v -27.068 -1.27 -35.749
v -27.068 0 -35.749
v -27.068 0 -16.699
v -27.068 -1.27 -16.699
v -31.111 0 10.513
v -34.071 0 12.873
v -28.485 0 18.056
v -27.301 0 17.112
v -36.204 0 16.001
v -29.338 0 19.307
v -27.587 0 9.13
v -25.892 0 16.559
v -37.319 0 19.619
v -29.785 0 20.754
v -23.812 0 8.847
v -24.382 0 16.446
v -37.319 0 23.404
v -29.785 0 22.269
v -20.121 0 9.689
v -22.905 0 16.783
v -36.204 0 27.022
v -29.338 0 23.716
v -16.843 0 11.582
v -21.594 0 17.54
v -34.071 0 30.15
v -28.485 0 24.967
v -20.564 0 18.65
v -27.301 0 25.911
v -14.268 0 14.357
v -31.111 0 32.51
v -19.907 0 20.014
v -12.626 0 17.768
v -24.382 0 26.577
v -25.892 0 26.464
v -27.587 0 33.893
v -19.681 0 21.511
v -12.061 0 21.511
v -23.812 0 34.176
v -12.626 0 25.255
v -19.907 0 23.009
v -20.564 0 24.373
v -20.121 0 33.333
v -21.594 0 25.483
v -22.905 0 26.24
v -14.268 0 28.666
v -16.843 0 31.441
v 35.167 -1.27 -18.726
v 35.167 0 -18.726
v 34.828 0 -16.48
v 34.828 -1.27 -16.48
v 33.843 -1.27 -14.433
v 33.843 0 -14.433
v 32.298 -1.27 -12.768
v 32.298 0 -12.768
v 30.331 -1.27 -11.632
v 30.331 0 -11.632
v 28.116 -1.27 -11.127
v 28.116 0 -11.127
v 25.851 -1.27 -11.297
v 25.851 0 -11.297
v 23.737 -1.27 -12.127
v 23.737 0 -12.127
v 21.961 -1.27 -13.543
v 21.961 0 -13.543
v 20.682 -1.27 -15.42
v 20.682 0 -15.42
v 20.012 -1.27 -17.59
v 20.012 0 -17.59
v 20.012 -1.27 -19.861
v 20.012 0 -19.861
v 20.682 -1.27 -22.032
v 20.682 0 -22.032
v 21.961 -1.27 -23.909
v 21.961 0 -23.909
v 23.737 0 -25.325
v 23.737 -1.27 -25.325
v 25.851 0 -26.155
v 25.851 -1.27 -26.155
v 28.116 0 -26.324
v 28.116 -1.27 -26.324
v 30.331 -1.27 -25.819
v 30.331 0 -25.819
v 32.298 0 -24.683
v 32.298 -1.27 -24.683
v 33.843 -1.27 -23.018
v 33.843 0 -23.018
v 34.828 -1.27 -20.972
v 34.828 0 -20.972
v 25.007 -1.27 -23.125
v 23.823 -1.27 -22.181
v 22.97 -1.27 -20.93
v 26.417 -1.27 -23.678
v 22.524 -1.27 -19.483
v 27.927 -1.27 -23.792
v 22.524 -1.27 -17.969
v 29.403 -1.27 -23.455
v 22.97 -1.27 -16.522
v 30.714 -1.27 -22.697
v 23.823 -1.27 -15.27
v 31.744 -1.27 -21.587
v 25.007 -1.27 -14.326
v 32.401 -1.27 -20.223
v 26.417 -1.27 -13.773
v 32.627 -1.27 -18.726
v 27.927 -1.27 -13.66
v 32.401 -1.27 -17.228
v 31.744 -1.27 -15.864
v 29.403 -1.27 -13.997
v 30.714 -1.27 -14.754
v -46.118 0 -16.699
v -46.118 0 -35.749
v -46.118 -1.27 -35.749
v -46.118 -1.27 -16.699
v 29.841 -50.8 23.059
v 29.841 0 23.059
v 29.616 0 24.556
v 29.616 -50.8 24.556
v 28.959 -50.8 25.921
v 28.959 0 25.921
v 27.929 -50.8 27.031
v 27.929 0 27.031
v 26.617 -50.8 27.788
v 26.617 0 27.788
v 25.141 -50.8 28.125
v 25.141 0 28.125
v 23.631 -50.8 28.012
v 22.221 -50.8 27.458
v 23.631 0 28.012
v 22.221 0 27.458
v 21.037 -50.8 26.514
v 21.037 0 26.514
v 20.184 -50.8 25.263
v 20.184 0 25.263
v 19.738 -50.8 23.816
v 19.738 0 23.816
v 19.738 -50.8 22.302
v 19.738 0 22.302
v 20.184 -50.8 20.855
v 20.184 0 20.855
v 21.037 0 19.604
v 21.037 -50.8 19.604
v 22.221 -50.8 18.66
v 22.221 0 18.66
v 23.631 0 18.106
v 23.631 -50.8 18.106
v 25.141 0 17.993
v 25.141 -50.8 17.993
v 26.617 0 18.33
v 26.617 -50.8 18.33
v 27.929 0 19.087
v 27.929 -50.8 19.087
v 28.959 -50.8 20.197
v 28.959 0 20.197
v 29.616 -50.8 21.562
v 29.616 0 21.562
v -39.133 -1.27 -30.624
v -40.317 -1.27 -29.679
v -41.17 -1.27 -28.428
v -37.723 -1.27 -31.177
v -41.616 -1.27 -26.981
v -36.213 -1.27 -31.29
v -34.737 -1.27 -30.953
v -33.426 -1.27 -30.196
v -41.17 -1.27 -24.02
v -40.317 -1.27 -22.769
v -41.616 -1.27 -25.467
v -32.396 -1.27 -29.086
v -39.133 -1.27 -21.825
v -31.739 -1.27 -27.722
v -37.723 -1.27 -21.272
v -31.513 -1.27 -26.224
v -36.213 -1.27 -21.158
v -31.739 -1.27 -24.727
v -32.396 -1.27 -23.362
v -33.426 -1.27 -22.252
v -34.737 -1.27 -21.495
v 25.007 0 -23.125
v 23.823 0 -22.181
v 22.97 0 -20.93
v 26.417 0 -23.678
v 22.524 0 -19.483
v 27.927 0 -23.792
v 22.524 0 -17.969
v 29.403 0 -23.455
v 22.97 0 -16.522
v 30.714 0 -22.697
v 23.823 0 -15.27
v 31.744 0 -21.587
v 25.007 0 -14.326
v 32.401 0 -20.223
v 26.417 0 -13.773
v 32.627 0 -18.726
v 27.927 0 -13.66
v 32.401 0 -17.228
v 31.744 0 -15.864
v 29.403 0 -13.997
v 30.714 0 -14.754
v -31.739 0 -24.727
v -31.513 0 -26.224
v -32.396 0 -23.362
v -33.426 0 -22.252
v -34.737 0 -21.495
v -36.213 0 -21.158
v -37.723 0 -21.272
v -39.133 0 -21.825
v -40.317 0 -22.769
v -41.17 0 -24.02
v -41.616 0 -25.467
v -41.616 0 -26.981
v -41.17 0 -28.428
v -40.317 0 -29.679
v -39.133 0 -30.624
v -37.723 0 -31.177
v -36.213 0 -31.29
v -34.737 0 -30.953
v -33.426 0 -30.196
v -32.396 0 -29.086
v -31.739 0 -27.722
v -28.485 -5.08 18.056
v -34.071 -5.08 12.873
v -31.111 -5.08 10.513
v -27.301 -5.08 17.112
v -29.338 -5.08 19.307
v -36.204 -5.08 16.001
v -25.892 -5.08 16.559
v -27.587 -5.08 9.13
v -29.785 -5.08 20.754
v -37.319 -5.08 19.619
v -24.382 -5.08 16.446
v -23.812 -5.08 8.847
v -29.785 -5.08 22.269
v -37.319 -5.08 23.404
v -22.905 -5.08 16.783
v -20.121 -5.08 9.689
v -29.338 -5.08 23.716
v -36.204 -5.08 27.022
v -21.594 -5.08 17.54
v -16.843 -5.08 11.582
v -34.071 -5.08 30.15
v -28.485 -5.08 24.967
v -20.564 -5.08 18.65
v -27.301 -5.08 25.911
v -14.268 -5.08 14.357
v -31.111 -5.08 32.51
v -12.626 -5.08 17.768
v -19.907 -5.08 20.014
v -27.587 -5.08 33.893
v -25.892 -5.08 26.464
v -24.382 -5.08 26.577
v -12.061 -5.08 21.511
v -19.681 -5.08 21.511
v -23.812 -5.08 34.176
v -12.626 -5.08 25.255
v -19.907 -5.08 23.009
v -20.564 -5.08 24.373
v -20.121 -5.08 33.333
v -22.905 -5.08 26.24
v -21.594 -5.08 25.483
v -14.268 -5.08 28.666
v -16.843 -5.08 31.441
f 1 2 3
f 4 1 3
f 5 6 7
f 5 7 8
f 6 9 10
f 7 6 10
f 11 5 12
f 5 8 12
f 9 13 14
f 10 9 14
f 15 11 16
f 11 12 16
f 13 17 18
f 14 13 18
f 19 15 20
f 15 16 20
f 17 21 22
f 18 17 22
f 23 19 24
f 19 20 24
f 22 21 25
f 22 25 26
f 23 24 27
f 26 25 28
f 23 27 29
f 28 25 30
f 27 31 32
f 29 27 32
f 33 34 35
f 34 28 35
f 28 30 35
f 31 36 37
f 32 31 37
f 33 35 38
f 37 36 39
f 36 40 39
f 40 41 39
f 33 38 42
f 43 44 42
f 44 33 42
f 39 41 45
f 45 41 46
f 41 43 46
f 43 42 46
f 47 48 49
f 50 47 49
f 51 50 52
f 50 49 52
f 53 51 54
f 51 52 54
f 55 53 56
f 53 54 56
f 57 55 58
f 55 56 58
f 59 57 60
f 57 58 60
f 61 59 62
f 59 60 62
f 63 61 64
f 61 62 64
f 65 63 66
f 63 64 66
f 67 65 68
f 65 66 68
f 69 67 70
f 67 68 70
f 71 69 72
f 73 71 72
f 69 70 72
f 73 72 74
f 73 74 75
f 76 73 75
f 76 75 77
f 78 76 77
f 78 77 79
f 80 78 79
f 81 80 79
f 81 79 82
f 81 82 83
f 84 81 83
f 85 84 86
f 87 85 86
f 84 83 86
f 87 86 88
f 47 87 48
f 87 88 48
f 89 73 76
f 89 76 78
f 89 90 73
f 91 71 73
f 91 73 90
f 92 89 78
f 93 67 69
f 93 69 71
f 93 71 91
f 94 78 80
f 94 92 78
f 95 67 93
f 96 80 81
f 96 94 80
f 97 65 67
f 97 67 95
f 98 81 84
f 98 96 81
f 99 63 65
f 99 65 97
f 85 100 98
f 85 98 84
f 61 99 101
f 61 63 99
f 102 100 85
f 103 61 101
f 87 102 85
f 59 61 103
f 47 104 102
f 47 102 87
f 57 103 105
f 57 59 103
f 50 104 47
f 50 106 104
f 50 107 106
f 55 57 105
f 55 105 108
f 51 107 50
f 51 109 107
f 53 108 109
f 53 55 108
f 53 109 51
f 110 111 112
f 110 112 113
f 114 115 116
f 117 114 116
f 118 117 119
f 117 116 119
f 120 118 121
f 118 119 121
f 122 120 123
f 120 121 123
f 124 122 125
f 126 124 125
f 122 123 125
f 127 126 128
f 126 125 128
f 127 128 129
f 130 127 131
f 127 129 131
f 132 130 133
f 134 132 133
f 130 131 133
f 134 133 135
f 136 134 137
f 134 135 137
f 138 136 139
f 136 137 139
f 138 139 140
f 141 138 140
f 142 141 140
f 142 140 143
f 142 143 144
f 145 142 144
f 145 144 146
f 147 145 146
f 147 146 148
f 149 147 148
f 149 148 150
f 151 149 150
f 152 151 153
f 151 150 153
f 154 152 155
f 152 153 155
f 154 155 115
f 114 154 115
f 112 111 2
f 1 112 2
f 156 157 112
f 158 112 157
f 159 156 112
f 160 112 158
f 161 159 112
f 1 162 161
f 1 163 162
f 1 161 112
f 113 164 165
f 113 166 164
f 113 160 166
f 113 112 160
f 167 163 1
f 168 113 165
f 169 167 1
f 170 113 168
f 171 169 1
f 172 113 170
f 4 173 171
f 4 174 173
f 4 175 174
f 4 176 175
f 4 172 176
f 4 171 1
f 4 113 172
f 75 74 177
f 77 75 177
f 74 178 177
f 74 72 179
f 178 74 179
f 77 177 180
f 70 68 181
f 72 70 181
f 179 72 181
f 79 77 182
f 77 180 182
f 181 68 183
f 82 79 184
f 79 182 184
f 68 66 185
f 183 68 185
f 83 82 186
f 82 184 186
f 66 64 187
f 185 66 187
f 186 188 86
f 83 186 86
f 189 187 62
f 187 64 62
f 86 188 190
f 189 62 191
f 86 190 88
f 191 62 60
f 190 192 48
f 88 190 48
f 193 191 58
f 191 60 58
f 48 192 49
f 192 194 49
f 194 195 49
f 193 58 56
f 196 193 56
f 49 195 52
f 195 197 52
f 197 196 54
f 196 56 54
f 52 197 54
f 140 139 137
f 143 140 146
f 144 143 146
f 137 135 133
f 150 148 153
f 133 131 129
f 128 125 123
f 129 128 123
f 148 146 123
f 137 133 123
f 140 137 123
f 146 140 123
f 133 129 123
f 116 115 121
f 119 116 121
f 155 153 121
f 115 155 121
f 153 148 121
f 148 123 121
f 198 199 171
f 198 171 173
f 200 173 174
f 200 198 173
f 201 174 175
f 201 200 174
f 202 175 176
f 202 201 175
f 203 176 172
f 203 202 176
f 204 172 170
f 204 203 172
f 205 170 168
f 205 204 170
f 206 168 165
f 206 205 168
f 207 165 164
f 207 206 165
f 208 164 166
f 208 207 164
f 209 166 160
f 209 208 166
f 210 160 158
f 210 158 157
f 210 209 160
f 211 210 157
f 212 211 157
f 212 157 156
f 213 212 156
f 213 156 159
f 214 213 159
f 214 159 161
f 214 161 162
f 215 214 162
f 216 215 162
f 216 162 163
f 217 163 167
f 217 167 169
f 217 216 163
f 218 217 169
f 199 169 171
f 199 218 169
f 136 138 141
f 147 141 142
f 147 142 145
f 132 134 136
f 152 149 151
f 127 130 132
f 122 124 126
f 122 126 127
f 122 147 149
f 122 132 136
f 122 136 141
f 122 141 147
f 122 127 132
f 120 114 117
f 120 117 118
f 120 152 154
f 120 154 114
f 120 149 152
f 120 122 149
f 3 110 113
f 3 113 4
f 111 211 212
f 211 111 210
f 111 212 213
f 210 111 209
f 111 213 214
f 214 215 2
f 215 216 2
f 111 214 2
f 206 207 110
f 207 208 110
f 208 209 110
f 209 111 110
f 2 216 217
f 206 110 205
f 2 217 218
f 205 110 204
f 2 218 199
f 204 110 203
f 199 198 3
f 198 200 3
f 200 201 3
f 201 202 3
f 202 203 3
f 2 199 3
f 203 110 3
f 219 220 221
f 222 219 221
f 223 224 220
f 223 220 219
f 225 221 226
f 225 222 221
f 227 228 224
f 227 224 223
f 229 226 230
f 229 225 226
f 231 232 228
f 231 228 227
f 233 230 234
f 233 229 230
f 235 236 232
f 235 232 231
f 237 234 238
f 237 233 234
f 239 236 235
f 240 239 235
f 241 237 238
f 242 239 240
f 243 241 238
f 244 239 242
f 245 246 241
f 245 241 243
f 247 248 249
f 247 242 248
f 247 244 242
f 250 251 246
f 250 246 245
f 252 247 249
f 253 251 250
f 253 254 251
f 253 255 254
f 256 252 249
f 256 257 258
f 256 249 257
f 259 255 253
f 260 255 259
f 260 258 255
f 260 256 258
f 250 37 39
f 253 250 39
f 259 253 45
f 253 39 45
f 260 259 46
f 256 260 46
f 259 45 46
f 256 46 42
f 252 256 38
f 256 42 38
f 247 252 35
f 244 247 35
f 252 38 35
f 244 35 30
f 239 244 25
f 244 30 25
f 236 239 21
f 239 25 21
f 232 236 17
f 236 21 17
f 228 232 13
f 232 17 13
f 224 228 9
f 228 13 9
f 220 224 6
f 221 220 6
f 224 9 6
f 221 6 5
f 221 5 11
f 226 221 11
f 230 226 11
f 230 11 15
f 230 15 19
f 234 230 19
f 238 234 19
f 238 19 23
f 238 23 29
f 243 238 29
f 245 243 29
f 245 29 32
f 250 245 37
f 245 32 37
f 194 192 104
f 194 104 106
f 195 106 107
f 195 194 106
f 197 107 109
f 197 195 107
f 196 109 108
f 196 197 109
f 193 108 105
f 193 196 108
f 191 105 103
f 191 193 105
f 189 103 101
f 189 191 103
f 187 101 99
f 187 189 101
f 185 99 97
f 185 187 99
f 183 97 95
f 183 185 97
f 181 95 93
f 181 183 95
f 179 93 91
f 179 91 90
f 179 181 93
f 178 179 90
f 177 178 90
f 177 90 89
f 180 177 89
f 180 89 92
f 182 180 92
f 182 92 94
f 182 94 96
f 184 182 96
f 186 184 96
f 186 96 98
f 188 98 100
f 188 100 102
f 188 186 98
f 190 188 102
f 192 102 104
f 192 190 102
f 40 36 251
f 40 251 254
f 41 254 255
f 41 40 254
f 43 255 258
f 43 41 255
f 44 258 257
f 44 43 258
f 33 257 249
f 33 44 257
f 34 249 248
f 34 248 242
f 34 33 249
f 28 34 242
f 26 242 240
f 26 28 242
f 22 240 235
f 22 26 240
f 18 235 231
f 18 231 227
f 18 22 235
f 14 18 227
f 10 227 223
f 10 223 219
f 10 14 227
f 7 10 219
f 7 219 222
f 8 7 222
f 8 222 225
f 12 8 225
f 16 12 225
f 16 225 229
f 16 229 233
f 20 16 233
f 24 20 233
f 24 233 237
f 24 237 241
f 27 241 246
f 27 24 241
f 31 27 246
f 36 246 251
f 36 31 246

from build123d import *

# Parameters (mm, degrees)
F0_R     = 12.7
F0_R_2   = 5.08
F1_DEPTH = 5.08
F2_R     = 5.08
F3_DEPTH = 50.8
F4_W     = 19.05
F4_H     = 19.05
F4_R     = 5.08
F5_DEPTH = 1.27
F6_R     = 7.62
F6_R_2   = 5.08
F7_DEPTH = 1.27


with BuildPart() as f1:
    # F0 (on Front) → F1 (new body)
    with BuildSketch(Plane.XZ):
        with Locations((-24.761315, 21.511393)):
            Circle(F0_R)
        with Locations((-24.761315, 21.511393)):
            Circle(F0_R_2, mode=Mode.SUBTRACT)
    extrude(amount=F1_DEPTH)


with BuildPart() as f3:
    # F2 (on Front) → F3 (new body)
    with BuildSketch(Plane.XZ):
        with Locations((24.761314, 23.058975)):
            Circle(F2_R)
    extrude(amount=F3_DEPTH)


with BuildPart() as f5:
    # F4 (on Front) → F5 (new body)
    with BuildSketch(Plane.XZ):
        with Locations((-36.59295, -26.224149)):
            Rectangle(F4_W, F4_H)
        with Locations((-36.59295, -26.224149)):
            Circle(F4_R, mode=Mode.SUBTRACT)
    extrude(amount=F5_DEPTH)


with BuildPart() as f7:
    # F6 (on Front) → F7 (new body)
    with BuildSketch(Plane.XZ):
        with Locations((27.546966, -18.725745)):
            Circle(F6_R)
        with Locations((27.546966, -18.725745)):
            Circle(F6_R_2, mode=Mode.SUBTRACT)
    extrude(amount=F7_DEPTH)


solid = Compound([f1.part, f3.part, f5.part, f7.part])
